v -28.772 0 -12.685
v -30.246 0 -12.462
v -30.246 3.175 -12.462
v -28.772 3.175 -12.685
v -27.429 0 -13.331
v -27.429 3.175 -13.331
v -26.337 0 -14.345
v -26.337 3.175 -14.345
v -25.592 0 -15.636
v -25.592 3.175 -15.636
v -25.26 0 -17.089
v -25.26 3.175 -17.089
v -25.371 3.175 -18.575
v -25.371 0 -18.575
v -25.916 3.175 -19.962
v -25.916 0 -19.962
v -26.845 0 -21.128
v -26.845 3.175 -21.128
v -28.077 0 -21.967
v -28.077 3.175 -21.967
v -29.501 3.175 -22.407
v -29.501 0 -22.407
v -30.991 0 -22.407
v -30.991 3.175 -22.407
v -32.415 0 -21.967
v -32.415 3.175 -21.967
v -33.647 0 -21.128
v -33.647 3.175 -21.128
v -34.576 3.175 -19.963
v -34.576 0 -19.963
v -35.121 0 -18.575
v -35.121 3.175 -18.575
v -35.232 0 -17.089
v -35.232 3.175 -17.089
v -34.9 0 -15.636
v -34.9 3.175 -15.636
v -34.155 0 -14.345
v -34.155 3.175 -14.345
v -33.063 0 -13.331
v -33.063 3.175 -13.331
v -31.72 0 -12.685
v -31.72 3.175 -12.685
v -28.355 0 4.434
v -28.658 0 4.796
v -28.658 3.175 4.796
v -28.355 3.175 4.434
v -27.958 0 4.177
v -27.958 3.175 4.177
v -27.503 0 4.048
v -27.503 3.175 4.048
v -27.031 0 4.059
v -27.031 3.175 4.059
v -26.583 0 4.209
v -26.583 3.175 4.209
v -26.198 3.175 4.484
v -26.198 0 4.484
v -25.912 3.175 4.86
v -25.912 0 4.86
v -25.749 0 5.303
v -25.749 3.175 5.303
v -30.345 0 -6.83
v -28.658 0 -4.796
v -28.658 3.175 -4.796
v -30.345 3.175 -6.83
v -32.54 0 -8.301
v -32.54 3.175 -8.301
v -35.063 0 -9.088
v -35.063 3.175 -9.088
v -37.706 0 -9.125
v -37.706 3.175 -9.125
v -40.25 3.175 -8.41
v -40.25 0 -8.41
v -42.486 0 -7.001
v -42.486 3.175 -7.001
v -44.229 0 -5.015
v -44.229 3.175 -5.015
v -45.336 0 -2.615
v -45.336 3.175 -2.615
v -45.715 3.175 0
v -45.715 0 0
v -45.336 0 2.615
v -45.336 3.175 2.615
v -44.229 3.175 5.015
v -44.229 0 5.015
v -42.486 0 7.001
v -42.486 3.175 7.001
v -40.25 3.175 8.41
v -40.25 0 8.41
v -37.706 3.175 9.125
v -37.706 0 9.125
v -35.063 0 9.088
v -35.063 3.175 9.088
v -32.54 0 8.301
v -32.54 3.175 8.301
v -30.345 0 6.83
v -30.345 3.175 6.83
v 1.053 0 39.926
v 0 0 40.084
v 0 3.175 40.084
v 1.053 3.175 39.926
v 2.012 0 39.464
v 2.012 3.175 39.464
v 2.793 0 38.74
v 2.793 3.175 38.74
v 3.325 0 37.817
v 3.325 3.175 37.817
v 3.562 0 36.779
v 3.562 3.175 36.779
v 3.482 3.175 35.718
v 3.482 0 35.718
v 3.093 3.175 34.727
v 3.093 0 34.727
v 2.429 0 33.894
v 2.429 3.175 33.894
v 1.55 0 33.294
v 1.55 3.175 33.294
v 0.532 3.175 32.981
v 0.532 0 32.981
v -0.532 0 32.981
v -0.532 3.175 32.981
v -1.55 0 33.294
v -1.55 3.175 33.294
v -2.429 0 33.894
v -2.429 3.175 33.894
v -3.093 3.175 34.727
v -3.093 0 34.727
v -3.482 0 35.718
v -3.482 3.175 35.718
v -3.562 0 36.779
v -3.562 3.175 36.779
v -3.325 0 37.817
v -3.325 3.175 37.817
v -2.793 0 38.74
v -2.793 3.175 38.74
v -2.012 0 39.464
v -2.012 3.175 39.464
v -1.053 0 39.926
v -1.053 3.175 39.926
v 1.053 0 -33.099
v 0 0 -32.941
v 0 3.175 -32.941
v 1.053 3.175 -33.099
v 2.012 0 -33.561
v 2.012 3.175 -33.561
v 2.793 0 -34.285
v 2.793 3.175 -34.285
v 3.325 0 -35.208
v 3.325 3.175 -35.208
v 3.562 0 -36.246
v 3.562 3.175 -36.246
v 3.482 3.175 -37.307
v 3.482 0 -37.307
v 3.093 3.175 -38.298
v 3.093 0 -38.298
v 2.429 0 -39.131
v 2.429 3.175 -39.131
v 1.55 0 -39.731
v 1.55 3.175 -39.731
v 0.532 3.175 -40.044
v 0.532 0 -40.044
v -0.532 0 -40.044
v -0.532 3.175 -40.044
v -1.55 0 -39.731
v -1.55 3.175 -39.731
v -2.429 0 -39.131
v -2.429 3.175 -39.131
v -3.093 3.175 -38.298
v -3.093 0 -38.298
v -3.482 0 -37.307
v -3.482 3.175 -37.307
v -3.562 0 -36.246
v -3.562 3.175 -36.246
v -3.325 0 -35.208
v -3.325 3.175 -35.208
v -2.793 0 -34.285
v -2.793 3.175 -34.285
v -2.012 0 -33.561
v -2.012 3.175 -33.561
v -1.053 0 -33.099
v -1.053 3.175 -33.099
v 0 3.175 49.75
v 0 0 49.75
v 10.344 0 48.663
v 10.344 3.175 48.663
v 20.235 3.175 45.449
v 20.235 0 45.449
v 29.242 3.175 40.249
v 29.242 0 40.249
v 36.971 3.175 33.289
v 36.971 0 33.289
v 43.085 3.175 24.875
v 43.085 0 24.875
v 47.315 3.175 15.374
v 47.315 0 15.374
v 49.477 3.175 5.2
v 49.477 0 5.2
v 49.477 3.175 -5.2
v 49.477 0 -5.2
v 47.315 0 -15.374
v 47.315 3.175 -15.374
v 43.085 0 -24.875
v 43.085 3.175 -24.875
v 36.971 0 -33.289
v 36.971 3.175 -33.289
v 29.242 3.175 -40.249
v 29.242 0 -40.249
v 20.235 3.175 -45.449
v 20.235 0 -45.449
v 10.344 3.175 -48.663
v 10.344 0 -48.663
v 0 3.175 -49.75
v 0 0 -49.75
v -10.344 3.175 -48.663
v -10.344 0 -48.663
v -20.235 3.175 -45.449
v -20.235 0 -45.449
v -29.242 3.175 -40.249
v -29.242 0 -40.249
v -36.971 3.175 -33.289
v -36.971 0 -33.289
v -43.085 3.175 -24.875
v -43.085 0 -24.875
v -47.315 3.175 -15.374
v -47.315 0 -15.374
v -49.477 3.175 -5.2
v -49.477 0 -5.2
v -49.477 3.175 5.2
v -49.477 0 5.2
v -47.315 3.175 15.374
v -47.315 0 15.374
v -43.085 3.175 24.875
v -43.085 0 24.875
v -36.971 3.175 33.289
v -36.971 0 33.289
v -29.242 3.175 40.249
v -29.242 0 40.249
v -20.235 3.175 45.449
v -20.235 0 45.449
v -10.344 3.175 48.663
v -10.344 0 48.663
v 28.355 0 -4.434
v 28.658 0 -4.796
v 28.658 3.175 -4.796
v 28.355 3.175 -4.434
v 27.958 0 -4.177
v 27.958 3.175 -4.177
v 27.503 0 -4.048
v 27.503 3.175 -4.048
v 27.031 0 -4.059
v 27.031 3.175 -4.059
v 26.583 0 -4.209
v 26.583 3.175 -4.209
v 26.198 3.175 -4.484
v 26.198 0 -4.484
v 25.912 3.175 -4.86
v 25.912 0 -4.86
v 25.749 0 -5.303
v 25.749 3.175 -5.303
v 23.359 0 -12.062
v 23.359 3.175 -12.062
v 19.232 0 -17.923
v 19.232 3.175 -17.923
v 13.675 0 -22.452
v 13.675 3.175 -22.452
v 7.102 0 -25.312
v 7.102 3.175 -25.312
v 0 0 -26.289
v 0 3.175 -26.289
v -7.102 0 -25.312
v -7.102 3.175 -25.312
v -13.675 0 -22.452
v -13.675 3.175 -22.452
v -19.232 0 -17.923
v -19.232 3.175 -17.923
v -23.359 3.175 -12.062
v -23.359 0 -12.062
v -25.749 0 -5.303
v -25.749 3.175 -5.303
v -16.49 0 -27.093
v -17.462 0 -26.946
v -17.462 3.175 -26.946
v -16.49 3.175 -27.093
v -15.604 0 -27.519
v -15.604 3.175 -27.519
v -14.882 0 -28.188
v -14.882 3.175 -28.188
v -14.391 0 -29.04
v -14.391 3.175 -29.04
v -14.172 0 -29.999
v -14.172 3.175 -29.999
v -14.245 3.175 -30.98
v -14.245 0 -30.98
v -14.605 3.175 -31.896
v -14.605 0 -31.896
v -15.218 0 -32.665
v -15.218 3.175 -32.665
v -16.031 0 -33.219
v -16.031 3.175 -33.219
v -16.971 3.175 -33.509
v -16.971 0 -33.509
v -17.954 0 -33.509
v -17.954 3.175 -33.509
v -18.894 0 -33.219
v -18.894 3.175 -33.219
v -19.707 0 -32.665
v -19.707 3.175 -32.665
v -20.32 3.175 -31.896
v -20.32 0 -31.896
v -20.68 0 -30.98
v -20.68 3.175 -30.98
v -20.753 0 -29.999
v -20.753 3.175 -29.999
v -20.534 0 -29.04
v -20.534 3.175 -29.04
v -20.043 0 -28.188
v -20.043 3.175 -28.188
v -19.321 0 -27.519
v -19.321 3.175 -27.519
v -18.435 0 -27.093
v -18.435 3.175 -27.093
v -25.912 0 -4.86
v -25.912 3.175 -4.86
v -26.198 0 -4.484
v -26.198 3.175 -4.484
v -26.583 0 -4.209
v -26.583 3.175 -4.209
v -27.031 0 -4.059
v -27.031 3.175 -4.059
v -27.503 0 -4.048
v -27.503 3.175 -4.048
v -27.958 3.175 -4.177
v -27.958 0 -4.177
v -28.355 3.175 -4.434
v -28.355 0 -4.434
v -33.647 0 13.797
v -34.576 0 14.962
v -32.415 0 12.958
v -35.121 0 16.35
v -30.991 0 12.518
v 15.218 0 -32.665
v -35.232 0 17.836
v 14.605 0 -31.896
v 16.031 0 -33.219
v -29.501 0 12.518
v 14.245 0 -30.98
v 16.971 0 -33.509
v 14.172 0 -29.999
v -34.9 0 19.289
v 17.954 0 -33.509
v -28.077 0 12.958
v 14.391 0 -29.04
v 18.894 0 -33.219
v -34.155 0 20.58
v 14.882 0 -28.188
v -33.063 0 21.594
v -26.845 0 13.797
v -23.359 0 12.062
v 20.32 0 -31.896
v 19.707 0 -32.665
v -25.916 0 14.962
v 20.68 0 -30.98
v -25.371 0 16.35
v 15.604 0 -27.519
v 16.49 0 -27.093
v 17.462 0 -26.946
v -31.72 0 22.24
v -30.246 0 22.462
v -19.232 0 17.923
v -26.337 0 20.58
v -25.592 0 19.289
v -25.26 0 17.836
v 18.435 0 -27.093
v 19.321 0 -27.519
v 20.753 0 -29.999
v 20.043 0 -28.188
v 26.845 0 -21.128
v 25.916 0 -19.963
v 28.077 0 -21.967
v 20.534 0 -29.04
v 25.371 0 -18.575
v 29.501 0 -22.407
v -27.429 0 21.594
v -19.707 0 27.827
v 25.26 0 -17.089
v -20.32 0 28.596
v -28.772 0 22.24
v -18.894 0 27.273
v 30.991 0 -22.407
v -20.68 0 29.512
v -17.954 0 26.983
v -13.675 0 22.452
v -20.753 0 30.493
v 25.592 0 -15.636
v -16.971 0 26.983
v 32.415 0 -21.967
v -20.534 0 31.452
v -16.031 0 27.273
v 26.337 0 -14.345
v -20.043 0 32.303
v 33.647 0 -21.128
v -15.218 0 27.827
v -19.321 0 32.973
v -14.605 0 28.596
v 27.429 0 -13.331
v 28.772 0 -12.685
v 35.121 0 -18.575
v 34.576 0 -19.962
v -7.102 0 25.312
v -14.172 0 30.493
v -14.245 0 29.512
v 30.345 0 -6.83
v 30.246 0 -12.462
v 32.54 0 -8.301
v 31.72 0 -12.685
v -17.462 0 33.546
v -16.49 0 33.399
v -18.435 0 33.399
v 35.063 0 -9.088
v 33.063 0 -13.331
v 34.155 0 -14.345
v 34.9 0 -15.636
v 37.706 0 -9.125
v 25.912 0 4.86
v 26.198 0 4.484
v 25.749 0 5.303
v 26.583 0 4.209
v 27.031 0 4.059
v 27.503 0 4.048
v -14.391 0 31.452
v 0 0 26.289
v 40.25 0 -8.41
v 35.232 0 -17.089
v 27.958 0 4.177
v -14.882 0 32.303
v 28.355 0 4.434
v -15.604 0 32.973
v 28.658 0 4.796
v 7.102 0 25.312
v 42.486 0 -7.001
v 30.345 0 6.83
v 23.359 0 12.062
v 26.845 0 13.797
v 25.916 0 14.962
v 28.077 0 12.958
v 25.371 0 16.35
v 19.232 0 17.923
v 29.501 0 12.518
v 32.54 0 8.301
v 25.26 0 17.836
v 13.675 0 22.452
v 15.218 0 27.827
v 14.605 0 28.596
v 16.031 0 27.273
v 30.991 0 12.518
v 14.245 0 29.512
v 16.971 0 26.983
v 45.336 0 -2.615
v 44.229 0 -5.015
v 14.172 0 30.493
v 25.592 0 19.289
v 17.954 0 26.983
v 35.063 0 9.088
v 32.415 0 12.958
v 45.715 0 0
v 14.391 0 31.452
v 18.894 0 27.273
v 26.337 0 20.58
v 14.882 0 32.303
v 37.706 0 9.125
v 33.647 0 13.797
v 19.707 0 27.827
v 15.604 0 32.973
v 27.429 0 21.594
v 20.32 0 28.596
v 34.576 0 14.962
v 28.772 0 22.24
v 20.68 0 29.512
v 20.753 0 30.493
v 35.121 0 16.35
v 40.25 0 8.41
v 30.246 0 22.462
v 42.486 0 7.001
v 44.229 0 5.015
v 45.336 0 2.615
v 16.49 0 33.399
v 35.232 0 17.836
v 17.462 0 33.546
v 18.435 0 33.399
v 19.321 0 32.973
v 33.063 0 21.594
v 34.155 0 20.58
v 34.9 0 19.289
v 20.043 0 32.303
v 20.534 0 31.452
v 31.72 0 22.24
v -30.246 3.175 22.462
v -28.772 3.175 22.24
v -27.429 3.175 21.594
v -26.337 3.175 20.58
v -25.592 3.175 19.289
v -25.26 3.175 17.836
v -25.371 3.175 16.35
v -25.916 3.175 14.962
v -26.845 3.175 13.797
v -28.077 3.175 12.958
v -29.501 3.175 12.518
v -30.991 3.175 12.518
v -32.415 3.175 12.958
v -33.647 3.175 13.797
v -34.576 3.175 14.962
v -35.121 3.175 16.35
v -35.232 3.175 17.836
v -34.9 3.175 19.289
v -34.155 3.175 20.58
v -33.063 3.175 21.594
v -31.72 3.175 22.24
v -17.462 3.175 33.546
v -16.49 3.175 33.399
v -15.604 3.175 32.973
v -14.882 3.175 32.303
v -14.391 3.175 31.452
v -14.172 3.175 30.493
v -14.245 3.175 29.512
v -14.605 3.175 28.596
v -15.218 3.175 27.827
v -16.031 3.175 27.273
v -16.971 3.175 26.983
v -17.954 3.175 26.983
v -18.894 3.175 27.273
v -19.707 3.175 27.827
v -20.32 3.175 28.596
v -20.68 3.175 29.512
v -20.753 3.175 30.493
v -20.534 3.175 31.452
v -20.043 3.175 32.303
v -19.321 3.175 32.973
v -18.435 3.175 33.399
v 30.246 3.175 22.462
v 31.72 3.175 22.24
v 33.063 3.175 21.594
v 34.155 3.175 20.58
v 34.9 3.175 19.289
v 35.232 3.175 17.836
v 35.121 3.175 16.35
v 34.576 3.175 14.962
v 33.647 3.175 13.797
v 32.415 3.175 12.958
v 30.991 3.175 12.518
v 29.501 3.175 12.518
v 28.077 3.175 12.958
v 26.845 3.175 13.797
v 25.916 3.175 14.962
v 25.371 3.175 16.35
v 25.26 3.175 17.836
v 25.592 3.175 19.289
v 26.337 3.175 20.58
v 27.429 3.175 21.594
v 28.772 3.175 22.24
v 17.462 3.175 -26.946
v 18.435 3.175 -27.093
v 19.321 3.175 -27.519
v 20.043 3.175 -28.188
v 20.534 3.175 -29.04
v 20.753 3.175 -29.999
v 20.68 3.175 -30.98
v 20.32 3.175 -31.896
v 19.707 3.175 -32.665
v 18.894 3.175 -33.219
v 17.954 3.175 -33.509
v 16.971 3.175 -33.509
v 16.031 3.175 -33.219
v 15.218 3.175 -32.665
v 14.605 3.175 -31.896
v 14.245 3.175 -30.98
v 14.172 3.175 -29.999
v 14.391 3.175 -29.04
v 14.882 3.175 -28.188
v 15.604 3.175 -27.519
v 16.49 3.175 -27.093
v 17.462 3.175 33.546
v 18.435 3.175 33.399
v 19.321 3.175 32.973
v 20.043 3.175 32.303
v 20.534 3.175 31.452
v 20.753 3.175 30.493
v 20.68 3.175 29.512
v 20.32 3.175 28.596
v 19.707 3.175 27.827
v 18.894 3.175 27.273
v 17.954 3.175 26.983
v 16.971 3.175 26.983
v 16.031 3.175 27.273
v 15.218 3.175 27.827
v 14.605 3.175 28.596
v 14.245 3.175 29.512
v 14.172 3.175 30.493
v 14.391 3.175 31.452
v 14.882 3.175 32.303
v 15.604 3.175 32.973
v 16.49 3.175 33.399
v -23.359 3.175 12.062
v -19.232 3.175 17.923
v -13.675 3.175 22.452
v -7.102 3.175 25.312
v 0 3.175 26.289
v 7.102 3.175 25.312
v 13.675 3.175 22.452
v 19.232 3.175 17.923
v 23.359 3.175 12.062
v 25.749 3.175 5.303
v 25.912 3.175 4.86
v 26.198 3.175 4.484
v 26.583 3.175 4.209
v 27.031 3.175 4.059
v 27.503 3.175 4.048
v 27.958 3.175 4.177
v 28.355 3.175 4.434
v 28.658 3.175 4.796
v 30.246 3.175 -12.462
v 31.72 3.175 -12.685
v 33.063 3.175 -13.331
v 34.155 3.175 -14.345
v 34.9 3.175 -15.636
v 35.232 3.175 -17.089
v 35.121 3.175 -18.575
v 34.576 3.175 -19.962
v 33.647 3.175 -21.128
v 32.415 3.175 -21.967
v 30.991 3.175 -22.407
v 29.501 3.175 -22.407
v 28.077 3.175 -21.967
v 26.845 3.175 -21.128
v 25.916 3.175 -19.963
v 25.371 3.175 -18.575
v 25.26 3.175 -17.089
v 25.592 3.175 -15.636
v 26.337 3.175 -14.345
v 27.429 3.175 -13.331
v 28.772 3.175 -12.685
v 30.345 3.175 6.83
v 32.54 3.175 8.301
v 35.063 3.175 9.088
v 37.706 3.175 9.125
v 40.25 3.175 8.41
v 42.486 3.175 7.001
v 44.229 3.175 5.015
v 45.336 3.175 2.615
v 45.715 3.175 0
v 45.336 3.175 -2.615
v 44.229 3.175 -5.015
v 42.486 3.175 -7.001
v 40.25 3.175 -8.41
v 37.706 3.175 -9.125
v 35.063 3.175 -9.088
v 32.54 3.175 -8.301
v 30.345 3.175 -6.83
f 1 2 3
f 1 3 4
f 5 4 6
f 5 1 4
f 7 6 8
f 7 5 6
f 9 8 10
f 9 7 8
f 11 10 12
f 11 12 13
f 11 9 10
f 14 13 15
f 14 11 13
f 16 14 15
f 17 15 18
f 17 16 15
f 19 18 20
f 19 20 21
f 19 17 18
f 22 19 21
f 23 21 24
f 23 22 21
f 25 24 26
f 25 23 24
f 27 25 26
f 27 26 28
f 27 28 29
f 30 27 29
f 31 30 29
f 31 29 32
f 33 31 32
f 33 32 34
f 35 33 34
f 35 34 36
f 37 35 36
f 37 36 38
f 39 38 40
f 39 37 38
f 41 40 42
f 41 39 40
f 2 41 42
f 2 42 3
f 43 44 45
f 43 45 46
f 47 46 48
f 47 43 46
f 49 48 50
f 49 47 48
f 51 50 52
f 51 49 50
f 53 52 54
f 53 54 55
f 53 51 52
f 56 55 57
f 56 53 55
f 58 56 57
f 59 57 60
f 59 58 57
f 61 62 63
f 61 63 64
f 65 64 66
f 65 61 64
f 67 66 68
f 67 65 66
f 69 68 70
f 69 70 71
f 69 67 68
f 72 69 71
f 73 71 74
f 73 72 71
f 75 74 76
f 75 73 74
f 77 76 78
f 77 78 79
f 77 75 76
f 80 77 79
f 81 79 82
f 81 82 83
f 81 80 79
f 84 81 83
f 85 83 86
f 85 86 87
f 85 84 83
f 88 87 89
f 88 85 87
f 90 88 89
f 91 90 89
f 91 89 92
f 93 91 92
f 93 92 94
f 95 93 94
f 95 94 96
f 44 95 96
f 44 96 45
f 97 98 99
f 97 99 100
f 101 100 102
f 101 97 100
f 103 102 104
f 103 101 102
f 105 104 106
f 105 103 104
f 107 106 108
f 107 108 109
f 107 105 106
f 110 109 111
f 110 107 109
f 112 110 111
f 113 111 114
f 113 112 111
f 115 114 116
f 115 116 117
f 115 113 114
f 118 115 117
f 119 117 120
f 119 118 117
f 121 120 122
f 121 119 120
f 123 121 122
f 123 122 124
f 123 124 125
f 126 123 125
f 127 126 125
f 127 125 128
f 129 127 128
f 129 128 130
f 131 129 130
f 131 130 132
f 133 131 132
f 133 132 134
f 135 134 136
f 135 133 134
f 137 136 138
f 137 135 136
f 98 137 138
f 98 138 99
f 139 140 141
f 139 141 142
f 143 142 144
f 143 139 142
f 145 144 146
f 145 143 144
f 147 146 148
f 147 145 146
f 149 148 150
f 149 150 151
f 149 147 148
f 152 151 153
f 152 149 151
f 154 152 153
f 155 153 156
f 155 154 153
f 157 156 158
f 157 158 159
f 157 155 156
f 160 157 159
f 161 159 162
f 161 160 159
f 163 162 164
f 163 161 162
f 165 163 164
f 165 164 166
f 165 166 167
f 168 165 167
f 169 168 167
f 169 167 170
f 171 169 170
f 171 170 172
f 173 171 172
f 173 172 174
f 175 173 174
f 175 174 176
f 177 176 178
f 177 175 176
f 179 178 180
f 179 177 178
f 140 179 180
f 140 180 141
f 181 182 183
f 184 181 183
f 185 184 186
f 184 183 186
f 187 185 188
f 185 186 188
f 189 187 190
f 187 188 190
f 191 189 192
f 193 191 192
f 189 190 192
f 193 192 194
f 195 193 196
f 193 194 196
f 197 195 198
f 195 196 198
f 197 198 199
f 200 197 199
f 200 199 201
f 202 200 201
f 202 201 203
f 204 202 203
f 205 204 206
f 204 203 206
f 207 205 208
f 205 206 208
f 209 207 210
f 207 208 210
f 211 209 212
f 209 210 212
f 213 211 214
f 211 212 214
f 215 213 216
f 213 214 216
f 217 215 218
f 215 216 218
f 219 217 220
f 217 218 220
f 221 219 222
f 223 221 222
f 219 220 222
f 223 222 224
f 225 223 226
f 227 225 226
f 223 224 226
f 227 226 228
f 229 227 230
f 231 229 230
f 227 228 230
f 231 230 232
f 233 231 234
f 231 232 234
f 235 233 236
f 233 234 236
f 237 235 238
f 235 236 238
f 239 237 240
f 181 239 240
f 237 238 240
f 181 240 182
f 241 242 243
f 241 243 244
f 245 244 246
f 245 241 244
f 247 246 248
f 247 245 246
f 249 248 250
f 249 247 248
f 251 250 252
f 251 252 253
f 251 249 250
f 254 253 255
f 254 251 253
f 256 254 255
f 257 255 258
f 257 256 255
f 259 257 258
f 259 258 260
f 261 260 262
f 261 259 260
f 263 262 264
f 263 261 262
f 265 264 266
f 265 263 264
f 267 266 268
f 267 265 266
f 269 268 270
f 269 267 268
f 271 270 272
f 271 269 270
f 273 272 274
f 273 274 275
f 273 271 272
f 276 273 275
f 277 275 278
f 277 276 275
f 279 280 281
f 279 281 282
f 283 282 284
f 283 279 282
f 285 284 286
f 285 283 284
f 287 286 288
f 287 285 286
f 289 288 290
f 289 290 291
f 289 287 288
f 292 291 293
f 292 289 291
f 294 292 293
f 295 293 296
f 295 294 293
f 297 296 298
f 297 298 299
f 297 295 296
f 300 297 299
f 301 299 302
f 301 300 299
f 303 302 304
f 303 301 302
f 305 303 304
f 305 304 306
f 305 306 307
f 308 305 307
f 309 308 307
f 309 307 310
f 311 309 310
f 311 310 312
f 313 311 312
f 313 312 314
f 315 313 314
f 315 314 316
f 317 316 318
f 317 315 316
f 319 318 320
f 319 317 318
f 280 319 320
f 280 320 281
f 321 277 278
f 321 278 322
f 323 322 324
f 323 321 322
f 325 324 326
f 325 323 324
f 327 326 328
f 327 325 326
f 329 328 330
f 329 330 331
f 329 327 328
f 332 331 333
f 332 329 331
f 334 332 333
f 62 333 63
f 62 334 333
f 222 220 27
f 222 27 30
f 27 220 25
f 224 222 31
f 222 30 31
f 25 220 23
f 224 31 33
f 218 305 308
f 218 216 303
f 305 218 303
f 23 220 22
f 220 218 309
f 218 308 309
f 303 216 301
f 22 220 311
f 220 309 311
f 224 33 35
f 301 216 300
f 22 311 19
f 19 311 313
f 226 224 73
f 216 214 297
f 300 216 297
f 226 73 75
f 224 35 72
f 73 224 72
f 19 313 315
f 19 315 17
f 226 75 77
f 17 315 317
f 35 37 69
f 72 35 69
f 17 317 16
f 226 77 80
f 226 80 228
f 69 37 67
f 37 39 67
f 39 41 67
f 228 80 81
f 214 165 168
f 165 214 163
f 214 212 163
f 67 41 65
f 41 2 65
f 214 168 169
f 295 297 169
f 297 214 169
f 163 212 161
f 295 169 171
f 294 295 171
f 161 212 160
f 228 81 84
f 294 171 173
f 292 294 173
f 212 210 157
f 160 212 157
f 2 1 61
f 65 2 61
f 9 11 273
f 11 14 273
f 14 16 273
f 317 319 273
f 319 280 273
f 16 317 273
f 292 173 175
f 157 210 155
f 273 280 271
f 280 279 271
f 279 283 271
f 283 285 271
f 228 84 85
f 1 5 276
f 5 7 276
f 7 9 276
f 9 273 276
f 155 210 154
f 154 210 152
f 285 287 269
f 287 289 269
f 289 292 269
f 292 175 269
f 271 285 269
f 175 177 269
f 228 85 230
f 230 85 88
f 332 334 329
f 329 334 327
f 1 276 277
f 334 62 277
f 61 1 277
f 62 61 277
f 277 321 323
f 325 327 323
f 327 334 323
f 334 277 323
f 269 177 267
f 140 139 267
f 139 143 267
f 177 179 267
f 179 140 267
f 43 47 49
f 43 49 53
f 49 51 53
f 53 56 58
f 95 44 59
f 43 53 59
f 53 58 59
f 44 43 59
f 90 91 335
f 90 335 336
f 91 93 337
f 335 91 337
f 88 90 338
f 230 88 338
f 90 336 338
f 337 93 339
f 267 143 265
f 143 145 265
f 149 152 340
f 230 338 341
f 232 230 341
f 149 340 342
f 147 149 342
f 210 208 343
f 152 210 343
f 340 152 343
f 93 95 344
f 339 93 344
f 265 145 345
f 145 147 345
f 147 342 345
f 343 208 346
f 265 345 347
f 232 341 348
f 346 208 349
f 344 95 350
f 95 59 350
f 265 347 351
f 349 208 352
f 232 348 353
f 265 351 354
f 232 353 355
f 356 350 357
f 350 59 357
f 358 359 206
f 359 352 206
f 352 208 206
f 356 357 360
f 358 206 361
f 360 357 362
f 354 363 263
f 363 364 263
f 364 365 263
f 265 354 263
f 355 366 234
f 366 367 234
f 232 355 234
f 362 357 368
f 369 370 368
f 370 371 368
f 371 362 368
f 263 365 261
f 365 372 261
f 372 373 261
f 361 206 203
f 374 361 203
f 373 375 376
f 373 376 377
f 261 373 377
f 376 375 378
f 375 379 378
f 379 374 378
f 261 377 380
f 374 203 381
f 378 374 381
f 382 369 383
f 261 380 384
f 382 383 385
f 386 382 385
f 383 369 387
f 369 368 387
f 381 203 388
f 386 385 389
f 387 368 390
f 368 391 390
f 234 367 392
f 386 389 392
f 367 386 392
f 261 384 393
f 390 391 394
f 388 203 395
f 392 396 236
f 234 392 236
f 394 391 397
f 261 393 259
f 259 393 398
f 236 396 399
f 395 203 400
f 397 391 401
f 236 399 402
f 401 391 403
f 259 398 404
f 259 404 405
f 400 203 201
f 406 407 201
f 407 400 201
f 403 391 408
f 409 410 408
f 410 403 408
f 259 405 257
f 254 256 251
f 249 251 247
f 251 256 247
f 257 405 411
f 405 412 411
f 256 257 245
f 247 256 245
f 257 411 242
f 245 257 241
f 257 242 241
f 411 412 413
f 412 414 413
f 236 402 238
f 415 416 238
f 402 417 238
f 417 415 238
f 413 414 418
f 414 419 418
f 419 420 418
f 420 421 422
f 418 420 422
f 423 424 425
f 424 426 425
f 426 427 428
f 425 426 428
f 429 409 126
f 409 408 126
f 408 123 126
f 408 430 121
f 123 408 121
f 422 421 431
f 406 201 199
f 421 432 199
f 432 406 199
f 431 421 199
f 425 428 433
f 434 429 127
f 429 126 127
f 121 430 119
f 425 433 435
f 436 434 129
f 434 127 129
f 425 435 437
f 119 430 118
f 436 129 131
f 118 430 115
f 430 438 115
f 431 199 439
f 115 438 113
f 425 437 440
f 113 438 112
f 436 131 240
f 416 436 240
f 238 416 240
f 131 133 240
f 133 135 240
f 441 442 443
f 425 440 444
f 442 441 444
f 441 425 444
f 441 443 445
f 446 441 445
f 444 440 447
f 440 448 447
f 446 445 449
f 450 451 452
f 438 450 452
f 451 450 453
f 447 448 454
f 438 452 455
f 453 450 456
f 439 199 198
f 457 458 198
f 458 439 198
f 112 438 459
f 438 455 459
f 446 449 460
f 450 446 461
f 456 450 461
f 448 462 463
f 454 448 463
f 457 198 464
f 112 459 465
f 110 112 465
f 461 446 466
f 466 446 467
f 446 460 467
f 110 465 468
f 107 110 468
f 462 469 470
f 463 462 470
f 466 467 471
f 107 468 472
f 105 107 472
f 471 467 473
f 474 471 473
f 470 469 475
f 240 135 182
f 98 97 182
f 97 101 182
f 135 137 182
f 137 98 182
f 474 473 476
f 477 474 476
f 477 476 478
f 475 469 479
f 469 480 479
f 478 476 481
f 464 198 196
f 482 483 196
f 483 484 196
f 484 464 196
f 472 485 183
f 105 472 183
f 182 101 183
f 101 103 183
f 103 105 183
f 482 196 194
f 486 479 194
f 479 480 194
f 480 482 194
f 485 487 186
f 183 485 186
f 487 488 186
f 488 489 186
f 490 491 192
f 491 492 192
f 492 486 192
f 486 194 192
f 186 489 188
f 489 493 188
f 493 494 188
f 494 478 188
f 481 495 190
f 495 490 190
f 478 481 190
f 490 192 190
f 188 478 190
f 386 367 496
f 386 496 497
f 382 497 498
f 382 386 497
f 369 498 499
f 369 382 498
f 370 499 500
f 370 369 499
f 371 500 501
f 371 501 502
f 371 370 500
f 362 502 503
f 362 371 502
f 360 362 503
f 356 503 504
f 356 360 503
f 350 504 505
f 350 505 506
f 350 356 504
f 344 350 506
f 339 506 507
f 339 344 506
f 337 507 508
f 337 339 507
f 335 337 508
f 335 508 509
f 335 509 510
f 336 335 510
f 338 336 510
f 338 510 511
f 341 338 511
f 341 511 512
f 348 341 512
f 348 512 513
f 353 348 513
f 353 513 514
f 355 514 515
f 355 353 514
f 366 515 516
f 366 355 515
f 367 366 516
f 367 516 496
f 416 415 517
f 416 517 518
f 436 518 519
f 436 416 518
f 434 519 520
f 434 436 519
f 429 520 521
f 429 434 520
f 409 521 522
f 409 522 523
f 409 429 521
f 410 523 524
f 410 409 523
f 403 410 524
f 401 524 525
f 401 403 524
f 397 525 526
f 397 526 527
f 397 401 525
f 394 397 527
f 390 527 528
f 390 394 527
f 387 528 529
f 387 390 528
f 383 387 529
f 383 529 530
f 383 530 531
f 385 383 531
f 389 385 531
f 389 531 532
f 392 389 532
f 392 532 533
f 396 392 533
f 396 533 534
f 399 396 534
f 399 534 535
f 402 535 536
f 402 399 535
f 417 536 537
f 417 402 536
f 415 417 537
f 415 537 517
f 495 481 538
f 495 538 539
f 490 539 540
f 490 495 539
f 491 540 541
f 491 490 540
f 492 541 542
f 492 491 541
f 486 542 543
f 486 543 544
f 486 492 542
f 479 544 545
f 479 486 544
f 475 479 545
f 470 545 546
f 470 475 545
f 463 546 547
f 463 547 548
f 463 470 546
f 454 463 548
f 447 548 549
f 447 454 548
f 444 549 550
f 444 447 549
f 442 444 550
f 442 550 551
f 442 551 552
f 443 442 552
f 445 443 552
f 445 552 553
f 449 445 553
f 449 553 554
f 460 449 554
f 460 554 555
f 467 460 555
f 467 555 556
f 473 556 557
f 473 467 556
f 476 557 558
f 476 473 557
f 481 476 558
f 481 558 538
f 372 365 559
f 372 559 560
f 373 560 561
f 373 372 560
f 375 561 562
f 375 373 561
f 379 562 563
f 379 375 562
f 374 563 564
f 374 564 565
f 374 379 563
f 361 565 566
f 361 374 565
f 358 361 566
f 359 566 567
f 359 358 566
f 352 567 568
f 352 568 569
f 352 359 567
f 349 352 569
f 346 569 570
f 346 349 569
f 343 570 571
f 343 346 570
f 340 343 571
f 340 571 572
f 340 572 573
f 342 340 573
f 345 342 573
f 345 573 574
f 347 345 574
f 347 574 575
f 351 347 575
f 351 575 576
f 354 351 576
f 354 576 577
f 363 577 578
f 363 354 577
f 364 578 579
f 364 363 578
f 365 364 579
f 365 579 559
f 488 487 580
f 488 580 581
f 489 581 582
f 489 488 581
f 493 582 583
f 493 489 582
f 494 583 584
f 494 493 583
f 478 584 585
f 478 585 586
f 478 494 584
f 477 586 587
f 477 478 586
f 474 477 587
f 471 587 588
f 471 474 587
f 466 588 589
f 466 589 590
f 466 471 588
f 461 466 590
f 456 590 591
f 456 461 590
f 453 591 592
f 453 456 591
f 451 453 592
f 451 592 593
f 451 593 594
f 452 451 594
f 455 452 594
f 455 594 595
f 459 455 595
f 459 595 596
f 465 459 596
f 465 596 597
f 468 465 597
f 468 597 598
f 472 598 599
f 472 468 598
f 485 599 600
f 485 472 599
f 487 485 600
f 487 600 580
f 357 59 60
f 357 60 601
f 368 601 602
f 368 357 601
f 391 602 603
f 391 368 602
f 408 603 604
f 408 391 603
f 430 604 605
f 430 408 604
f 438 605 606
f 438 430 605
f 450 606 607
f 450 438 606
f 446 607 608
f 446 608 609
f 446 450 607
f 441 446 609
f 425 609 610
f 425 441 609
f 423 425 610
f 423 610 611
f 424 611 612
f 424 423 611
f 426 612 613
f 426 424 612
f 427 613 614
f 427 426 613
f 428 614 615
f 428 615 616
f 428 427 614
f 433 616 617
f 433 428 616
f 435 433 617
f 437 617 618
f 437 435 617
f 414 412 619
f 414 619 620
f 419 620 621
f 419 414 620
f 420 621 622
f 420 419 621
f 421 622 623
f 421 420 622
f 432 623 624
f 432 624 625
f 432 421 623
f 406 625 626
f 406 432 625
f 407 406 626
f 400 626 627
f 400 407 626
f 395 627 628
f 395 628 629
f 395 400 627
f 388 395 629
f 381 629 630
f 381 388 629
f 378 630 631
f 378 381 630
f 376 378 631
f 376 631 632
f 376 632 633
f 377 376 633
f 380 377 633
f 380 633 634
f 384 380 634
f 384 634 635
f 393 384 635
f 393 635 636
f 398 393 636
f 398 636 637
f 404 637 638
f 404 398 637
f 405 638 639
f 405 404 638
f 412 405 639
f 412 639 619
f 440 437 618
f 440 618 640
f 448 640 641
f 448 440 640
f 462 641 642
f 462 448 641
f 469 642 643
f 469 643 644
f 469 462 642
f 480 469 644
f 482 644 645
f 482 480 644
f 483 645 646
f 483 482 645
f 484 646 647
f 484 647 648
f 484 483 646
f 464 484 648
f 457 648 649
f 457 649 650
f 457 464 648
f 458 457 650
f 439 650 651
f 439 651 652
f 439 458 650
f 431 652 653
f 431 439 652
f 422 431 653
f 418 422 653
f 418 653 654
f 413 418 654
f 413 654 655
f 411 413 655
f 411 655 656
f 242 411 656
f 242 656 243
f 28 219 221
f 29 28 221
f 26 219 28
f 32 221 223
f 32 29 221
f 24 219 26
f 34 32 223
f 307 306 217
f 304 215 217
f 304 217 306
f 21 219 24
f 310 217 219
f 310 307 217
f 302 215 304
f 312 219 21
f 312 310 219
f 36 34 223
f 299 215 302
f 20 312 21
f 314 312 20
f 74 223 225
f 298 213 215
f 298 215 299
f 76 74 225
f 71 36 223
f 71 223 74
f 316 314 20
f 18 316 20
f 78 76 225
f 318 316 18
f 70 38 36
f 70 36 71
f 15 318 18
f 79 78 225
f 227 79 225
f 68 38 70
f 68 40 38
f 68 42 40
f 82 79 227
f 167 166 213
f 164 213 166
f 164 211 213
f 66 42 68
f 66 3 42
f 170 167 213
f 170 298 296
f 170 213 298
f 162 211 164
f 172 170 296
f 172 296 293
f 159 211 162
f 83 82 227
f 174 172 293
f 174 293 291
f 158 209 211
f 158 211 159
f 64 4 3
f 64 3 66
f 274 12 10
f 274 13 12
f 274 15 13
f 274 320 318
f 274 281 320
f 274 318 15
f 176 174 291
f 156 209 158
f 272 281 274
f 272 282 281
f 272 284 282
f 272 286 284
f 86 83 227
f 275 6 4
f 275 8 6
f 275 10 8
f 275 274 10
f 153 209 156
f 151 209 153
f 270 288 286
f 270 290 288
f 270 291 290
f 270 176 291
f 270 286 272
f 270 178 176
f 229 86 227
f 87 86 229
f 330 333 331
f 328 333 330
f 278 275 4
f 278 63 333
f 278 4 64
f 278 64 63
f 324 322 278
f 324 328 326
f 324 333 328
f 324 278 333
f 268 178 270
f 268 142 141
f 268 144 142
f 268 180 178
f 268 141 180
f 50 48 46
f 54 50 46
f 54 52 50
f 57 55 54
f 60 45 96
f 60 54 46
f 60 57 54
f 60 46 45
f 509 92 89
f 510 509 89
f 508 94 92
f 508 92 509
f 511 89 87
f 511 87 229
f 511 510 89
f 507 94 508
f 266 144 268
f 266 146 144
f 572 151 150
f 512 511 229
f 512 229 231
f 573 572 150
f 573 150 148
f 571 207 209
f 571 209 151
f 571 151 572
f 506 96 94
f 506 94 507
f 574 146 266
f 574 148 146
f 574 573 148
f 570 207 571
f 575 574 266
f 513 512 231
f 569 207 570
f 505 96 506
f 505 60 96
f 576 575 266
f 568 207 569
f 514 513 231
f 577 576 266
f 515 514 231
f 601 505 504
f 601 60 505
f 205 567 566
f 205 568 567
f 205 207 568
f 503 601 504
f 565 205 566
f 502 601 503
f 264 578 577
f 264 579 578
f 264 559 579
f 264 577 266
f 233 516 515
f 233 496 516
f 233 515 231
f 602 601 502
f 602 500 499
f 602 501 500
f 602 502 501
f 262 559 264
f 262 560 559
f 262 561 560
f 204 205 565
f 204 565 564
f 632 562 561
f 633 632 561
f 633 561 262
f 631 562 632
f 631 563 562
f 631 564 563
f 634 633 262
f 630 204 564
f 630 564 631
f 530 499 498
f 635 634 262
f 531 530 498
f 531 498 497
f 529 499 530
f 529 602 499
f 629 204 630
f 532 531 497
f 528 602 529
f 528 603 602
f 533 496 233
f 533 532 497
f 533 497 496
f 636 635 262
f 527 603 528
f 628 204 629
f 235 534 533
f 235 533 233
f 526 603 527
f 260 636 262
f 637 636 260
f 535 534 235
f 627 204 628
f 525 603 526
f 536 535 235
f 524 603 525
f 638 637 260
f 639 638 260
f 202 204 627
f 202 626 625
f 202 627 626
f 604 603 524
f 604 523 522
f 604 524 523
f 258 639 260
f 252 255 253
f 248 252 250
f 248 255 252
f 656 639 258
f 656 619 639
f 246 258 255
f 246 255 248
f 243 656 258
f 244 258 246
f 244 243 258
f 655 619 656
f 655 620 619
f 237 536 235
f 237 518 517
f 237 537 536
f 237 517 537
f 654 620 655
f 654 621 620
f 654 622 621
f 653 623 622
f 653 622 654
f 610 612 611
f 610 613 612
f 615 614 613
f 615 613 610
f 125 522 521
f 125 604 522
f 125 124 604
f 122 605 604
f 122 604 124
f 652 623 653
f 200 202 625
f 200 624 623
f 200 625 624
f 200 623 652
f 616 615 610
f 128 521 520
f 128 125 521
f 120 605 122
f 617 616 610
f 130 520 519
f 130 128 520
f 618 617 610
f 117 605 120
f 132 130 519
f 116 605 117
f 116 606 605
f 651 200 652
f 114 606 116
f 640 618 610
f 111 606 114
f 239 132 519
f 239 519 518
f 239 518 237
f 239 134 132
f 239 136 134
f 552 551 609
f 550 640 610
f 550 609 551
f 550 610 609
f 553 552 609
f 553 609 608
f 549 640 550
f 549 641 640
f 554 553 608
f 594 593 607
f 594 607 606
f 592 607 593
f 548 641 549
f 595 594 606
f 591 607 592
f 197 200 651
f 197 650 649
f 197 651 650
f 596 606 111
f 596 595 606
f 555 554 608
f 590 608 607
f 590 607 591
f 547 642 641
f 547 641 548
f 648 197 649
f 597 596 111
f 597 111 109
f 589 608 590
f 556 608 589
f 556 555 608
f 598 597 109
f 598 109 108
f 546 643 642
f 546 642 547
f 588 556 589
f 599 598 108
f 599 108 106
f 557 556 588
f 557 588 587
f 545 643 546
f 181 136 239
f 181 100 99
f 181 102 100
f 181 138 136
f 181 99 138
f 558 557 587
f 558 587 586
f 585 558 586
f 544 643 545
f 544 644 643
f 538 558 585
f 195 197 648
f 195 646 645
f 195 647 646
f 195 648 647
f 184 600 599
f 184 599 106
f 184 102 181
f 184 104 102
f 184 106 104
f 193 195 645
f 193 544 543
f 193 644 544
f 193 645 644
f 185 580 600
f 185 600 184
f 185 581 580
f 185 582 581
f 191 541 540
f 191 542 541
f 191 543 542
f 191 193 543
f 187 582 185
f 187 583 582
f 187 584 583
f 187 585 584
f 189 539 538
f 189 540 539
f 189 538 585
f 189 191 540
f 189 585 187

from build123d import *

# Parameters (mm, degrees)
SKETCH1_R           = 49.75
SKETCH1_R_2         = 3.571875
SKETCH1_R_3         = 5
SKETCH1_R_4         = 3.3
BOSS_EXTRUDE1_DEPTH = 3.175


with BuildPart() as part:
    # Sketch1 → Boss-Extrude1 (new body)
    with BuildSketch(Plane(origin=(0, 0, 0), x_dir=(1, 0, 0), z_dir=(0, 1, 0))):
        with Locations(Location((0, 0, 0), (0, 0, 270))):
            Circle(SKETCH1_R)
        with Locations(Location((0, 36.5125, 0), (0, 0, 270))):
            Circle(SKETCH1_R_2, mode=Mode.SUBTRACT)
        with Locations(Location((0, -36.5125, 0), (0, 0, 270))):
            Circle(SKETCH1_R_2, mode=Mode.SUBTRACT)
        with Locations(Location((30.245937227, -17.4625, 0), (0, 0, 270))):
            Circle(SKETCH1_R_3, mode=Mode.SUBTRACT)
        with Locations(Location((17.4625, 30.245937227, 0), (0, 0, 270))):
            Circle(SKETCH1_R_4, mode=Mode.SUBTRACT)
        with Locations(Location((-30.245937227, 17.4625, 0), (0, 0, 270))):
            Circle(SKETCH1_R_3, mode=Mode.SUBTRACT)
        with Locations(Location((-17.4625, 30.245937227, 0), (0, 0, 270))):
            Circle(SKETCH1_R_4, mode=Mode.SUBTRACT)
        with Locations(Location((-17.4625, -30.245937227, 0), (0, 0, 270))):
            Circle(SKETCH1_R_4, mode=Mode.SUBTRACT)
        with Locations(Location((17.4625, -30.245937227, 0), (0, 0, 270))):
            Circle(SKETCH1_R_4, mode=Mode.SUBTRACT)
        with Locations(Location((30.245937227, 17.4625, 0), (0, 0, 270))):
            Circle(SKETCH1_R_3, mode=Mode.SUBTRACT)
        with Locations(Location((-30.245937227, -17.4625, 0), (0, 0, 270))):
            Circle(SKETCH1_R_3, mode=Mode.SUBTRACT)
        with BuildLine():
            ThreePointArc((-25.748561188, -5.303123397), (0, -26.289), (25.748561188, -5.303123397))
            ThreePointArc((25.748561188, -5.303123397), (27.03087337, -4.059432148), (28.658299321, -4.796030566))
            ThreePointArc((28.658299321, -4.796030566), (45.7152375, 0), (28.658299321, 4.796030566))
            ThreePointArc((28.658299321, 4.796030566), (27.03087337, 4.059432148), (25.748561188, 5.303123397))
            ThreePointArc((25.748561188, 5.303123397), (0, 26.289), (-25.748561188, 5.303123397))
            ThreePointArc((-25.748561188, 5.303123397), (-27.03087337, 4.059432148), (-28.658299321, 4.796030566))
            ThreePointArc((-28.658299321, 4.796030566), (-45.7152375, 0), (-28.658299321, -4.796030566))
            ThreePointArc((-28.658299321, -4.796030566), (-27.03087337, -4.059432148), (-25.748561188, -5.303123397))
        make_face(mode=Mode.SUBTRACT)
    extrude(amount=BOSS_EXTRUDE1_DEPTH)


solid = part.part
